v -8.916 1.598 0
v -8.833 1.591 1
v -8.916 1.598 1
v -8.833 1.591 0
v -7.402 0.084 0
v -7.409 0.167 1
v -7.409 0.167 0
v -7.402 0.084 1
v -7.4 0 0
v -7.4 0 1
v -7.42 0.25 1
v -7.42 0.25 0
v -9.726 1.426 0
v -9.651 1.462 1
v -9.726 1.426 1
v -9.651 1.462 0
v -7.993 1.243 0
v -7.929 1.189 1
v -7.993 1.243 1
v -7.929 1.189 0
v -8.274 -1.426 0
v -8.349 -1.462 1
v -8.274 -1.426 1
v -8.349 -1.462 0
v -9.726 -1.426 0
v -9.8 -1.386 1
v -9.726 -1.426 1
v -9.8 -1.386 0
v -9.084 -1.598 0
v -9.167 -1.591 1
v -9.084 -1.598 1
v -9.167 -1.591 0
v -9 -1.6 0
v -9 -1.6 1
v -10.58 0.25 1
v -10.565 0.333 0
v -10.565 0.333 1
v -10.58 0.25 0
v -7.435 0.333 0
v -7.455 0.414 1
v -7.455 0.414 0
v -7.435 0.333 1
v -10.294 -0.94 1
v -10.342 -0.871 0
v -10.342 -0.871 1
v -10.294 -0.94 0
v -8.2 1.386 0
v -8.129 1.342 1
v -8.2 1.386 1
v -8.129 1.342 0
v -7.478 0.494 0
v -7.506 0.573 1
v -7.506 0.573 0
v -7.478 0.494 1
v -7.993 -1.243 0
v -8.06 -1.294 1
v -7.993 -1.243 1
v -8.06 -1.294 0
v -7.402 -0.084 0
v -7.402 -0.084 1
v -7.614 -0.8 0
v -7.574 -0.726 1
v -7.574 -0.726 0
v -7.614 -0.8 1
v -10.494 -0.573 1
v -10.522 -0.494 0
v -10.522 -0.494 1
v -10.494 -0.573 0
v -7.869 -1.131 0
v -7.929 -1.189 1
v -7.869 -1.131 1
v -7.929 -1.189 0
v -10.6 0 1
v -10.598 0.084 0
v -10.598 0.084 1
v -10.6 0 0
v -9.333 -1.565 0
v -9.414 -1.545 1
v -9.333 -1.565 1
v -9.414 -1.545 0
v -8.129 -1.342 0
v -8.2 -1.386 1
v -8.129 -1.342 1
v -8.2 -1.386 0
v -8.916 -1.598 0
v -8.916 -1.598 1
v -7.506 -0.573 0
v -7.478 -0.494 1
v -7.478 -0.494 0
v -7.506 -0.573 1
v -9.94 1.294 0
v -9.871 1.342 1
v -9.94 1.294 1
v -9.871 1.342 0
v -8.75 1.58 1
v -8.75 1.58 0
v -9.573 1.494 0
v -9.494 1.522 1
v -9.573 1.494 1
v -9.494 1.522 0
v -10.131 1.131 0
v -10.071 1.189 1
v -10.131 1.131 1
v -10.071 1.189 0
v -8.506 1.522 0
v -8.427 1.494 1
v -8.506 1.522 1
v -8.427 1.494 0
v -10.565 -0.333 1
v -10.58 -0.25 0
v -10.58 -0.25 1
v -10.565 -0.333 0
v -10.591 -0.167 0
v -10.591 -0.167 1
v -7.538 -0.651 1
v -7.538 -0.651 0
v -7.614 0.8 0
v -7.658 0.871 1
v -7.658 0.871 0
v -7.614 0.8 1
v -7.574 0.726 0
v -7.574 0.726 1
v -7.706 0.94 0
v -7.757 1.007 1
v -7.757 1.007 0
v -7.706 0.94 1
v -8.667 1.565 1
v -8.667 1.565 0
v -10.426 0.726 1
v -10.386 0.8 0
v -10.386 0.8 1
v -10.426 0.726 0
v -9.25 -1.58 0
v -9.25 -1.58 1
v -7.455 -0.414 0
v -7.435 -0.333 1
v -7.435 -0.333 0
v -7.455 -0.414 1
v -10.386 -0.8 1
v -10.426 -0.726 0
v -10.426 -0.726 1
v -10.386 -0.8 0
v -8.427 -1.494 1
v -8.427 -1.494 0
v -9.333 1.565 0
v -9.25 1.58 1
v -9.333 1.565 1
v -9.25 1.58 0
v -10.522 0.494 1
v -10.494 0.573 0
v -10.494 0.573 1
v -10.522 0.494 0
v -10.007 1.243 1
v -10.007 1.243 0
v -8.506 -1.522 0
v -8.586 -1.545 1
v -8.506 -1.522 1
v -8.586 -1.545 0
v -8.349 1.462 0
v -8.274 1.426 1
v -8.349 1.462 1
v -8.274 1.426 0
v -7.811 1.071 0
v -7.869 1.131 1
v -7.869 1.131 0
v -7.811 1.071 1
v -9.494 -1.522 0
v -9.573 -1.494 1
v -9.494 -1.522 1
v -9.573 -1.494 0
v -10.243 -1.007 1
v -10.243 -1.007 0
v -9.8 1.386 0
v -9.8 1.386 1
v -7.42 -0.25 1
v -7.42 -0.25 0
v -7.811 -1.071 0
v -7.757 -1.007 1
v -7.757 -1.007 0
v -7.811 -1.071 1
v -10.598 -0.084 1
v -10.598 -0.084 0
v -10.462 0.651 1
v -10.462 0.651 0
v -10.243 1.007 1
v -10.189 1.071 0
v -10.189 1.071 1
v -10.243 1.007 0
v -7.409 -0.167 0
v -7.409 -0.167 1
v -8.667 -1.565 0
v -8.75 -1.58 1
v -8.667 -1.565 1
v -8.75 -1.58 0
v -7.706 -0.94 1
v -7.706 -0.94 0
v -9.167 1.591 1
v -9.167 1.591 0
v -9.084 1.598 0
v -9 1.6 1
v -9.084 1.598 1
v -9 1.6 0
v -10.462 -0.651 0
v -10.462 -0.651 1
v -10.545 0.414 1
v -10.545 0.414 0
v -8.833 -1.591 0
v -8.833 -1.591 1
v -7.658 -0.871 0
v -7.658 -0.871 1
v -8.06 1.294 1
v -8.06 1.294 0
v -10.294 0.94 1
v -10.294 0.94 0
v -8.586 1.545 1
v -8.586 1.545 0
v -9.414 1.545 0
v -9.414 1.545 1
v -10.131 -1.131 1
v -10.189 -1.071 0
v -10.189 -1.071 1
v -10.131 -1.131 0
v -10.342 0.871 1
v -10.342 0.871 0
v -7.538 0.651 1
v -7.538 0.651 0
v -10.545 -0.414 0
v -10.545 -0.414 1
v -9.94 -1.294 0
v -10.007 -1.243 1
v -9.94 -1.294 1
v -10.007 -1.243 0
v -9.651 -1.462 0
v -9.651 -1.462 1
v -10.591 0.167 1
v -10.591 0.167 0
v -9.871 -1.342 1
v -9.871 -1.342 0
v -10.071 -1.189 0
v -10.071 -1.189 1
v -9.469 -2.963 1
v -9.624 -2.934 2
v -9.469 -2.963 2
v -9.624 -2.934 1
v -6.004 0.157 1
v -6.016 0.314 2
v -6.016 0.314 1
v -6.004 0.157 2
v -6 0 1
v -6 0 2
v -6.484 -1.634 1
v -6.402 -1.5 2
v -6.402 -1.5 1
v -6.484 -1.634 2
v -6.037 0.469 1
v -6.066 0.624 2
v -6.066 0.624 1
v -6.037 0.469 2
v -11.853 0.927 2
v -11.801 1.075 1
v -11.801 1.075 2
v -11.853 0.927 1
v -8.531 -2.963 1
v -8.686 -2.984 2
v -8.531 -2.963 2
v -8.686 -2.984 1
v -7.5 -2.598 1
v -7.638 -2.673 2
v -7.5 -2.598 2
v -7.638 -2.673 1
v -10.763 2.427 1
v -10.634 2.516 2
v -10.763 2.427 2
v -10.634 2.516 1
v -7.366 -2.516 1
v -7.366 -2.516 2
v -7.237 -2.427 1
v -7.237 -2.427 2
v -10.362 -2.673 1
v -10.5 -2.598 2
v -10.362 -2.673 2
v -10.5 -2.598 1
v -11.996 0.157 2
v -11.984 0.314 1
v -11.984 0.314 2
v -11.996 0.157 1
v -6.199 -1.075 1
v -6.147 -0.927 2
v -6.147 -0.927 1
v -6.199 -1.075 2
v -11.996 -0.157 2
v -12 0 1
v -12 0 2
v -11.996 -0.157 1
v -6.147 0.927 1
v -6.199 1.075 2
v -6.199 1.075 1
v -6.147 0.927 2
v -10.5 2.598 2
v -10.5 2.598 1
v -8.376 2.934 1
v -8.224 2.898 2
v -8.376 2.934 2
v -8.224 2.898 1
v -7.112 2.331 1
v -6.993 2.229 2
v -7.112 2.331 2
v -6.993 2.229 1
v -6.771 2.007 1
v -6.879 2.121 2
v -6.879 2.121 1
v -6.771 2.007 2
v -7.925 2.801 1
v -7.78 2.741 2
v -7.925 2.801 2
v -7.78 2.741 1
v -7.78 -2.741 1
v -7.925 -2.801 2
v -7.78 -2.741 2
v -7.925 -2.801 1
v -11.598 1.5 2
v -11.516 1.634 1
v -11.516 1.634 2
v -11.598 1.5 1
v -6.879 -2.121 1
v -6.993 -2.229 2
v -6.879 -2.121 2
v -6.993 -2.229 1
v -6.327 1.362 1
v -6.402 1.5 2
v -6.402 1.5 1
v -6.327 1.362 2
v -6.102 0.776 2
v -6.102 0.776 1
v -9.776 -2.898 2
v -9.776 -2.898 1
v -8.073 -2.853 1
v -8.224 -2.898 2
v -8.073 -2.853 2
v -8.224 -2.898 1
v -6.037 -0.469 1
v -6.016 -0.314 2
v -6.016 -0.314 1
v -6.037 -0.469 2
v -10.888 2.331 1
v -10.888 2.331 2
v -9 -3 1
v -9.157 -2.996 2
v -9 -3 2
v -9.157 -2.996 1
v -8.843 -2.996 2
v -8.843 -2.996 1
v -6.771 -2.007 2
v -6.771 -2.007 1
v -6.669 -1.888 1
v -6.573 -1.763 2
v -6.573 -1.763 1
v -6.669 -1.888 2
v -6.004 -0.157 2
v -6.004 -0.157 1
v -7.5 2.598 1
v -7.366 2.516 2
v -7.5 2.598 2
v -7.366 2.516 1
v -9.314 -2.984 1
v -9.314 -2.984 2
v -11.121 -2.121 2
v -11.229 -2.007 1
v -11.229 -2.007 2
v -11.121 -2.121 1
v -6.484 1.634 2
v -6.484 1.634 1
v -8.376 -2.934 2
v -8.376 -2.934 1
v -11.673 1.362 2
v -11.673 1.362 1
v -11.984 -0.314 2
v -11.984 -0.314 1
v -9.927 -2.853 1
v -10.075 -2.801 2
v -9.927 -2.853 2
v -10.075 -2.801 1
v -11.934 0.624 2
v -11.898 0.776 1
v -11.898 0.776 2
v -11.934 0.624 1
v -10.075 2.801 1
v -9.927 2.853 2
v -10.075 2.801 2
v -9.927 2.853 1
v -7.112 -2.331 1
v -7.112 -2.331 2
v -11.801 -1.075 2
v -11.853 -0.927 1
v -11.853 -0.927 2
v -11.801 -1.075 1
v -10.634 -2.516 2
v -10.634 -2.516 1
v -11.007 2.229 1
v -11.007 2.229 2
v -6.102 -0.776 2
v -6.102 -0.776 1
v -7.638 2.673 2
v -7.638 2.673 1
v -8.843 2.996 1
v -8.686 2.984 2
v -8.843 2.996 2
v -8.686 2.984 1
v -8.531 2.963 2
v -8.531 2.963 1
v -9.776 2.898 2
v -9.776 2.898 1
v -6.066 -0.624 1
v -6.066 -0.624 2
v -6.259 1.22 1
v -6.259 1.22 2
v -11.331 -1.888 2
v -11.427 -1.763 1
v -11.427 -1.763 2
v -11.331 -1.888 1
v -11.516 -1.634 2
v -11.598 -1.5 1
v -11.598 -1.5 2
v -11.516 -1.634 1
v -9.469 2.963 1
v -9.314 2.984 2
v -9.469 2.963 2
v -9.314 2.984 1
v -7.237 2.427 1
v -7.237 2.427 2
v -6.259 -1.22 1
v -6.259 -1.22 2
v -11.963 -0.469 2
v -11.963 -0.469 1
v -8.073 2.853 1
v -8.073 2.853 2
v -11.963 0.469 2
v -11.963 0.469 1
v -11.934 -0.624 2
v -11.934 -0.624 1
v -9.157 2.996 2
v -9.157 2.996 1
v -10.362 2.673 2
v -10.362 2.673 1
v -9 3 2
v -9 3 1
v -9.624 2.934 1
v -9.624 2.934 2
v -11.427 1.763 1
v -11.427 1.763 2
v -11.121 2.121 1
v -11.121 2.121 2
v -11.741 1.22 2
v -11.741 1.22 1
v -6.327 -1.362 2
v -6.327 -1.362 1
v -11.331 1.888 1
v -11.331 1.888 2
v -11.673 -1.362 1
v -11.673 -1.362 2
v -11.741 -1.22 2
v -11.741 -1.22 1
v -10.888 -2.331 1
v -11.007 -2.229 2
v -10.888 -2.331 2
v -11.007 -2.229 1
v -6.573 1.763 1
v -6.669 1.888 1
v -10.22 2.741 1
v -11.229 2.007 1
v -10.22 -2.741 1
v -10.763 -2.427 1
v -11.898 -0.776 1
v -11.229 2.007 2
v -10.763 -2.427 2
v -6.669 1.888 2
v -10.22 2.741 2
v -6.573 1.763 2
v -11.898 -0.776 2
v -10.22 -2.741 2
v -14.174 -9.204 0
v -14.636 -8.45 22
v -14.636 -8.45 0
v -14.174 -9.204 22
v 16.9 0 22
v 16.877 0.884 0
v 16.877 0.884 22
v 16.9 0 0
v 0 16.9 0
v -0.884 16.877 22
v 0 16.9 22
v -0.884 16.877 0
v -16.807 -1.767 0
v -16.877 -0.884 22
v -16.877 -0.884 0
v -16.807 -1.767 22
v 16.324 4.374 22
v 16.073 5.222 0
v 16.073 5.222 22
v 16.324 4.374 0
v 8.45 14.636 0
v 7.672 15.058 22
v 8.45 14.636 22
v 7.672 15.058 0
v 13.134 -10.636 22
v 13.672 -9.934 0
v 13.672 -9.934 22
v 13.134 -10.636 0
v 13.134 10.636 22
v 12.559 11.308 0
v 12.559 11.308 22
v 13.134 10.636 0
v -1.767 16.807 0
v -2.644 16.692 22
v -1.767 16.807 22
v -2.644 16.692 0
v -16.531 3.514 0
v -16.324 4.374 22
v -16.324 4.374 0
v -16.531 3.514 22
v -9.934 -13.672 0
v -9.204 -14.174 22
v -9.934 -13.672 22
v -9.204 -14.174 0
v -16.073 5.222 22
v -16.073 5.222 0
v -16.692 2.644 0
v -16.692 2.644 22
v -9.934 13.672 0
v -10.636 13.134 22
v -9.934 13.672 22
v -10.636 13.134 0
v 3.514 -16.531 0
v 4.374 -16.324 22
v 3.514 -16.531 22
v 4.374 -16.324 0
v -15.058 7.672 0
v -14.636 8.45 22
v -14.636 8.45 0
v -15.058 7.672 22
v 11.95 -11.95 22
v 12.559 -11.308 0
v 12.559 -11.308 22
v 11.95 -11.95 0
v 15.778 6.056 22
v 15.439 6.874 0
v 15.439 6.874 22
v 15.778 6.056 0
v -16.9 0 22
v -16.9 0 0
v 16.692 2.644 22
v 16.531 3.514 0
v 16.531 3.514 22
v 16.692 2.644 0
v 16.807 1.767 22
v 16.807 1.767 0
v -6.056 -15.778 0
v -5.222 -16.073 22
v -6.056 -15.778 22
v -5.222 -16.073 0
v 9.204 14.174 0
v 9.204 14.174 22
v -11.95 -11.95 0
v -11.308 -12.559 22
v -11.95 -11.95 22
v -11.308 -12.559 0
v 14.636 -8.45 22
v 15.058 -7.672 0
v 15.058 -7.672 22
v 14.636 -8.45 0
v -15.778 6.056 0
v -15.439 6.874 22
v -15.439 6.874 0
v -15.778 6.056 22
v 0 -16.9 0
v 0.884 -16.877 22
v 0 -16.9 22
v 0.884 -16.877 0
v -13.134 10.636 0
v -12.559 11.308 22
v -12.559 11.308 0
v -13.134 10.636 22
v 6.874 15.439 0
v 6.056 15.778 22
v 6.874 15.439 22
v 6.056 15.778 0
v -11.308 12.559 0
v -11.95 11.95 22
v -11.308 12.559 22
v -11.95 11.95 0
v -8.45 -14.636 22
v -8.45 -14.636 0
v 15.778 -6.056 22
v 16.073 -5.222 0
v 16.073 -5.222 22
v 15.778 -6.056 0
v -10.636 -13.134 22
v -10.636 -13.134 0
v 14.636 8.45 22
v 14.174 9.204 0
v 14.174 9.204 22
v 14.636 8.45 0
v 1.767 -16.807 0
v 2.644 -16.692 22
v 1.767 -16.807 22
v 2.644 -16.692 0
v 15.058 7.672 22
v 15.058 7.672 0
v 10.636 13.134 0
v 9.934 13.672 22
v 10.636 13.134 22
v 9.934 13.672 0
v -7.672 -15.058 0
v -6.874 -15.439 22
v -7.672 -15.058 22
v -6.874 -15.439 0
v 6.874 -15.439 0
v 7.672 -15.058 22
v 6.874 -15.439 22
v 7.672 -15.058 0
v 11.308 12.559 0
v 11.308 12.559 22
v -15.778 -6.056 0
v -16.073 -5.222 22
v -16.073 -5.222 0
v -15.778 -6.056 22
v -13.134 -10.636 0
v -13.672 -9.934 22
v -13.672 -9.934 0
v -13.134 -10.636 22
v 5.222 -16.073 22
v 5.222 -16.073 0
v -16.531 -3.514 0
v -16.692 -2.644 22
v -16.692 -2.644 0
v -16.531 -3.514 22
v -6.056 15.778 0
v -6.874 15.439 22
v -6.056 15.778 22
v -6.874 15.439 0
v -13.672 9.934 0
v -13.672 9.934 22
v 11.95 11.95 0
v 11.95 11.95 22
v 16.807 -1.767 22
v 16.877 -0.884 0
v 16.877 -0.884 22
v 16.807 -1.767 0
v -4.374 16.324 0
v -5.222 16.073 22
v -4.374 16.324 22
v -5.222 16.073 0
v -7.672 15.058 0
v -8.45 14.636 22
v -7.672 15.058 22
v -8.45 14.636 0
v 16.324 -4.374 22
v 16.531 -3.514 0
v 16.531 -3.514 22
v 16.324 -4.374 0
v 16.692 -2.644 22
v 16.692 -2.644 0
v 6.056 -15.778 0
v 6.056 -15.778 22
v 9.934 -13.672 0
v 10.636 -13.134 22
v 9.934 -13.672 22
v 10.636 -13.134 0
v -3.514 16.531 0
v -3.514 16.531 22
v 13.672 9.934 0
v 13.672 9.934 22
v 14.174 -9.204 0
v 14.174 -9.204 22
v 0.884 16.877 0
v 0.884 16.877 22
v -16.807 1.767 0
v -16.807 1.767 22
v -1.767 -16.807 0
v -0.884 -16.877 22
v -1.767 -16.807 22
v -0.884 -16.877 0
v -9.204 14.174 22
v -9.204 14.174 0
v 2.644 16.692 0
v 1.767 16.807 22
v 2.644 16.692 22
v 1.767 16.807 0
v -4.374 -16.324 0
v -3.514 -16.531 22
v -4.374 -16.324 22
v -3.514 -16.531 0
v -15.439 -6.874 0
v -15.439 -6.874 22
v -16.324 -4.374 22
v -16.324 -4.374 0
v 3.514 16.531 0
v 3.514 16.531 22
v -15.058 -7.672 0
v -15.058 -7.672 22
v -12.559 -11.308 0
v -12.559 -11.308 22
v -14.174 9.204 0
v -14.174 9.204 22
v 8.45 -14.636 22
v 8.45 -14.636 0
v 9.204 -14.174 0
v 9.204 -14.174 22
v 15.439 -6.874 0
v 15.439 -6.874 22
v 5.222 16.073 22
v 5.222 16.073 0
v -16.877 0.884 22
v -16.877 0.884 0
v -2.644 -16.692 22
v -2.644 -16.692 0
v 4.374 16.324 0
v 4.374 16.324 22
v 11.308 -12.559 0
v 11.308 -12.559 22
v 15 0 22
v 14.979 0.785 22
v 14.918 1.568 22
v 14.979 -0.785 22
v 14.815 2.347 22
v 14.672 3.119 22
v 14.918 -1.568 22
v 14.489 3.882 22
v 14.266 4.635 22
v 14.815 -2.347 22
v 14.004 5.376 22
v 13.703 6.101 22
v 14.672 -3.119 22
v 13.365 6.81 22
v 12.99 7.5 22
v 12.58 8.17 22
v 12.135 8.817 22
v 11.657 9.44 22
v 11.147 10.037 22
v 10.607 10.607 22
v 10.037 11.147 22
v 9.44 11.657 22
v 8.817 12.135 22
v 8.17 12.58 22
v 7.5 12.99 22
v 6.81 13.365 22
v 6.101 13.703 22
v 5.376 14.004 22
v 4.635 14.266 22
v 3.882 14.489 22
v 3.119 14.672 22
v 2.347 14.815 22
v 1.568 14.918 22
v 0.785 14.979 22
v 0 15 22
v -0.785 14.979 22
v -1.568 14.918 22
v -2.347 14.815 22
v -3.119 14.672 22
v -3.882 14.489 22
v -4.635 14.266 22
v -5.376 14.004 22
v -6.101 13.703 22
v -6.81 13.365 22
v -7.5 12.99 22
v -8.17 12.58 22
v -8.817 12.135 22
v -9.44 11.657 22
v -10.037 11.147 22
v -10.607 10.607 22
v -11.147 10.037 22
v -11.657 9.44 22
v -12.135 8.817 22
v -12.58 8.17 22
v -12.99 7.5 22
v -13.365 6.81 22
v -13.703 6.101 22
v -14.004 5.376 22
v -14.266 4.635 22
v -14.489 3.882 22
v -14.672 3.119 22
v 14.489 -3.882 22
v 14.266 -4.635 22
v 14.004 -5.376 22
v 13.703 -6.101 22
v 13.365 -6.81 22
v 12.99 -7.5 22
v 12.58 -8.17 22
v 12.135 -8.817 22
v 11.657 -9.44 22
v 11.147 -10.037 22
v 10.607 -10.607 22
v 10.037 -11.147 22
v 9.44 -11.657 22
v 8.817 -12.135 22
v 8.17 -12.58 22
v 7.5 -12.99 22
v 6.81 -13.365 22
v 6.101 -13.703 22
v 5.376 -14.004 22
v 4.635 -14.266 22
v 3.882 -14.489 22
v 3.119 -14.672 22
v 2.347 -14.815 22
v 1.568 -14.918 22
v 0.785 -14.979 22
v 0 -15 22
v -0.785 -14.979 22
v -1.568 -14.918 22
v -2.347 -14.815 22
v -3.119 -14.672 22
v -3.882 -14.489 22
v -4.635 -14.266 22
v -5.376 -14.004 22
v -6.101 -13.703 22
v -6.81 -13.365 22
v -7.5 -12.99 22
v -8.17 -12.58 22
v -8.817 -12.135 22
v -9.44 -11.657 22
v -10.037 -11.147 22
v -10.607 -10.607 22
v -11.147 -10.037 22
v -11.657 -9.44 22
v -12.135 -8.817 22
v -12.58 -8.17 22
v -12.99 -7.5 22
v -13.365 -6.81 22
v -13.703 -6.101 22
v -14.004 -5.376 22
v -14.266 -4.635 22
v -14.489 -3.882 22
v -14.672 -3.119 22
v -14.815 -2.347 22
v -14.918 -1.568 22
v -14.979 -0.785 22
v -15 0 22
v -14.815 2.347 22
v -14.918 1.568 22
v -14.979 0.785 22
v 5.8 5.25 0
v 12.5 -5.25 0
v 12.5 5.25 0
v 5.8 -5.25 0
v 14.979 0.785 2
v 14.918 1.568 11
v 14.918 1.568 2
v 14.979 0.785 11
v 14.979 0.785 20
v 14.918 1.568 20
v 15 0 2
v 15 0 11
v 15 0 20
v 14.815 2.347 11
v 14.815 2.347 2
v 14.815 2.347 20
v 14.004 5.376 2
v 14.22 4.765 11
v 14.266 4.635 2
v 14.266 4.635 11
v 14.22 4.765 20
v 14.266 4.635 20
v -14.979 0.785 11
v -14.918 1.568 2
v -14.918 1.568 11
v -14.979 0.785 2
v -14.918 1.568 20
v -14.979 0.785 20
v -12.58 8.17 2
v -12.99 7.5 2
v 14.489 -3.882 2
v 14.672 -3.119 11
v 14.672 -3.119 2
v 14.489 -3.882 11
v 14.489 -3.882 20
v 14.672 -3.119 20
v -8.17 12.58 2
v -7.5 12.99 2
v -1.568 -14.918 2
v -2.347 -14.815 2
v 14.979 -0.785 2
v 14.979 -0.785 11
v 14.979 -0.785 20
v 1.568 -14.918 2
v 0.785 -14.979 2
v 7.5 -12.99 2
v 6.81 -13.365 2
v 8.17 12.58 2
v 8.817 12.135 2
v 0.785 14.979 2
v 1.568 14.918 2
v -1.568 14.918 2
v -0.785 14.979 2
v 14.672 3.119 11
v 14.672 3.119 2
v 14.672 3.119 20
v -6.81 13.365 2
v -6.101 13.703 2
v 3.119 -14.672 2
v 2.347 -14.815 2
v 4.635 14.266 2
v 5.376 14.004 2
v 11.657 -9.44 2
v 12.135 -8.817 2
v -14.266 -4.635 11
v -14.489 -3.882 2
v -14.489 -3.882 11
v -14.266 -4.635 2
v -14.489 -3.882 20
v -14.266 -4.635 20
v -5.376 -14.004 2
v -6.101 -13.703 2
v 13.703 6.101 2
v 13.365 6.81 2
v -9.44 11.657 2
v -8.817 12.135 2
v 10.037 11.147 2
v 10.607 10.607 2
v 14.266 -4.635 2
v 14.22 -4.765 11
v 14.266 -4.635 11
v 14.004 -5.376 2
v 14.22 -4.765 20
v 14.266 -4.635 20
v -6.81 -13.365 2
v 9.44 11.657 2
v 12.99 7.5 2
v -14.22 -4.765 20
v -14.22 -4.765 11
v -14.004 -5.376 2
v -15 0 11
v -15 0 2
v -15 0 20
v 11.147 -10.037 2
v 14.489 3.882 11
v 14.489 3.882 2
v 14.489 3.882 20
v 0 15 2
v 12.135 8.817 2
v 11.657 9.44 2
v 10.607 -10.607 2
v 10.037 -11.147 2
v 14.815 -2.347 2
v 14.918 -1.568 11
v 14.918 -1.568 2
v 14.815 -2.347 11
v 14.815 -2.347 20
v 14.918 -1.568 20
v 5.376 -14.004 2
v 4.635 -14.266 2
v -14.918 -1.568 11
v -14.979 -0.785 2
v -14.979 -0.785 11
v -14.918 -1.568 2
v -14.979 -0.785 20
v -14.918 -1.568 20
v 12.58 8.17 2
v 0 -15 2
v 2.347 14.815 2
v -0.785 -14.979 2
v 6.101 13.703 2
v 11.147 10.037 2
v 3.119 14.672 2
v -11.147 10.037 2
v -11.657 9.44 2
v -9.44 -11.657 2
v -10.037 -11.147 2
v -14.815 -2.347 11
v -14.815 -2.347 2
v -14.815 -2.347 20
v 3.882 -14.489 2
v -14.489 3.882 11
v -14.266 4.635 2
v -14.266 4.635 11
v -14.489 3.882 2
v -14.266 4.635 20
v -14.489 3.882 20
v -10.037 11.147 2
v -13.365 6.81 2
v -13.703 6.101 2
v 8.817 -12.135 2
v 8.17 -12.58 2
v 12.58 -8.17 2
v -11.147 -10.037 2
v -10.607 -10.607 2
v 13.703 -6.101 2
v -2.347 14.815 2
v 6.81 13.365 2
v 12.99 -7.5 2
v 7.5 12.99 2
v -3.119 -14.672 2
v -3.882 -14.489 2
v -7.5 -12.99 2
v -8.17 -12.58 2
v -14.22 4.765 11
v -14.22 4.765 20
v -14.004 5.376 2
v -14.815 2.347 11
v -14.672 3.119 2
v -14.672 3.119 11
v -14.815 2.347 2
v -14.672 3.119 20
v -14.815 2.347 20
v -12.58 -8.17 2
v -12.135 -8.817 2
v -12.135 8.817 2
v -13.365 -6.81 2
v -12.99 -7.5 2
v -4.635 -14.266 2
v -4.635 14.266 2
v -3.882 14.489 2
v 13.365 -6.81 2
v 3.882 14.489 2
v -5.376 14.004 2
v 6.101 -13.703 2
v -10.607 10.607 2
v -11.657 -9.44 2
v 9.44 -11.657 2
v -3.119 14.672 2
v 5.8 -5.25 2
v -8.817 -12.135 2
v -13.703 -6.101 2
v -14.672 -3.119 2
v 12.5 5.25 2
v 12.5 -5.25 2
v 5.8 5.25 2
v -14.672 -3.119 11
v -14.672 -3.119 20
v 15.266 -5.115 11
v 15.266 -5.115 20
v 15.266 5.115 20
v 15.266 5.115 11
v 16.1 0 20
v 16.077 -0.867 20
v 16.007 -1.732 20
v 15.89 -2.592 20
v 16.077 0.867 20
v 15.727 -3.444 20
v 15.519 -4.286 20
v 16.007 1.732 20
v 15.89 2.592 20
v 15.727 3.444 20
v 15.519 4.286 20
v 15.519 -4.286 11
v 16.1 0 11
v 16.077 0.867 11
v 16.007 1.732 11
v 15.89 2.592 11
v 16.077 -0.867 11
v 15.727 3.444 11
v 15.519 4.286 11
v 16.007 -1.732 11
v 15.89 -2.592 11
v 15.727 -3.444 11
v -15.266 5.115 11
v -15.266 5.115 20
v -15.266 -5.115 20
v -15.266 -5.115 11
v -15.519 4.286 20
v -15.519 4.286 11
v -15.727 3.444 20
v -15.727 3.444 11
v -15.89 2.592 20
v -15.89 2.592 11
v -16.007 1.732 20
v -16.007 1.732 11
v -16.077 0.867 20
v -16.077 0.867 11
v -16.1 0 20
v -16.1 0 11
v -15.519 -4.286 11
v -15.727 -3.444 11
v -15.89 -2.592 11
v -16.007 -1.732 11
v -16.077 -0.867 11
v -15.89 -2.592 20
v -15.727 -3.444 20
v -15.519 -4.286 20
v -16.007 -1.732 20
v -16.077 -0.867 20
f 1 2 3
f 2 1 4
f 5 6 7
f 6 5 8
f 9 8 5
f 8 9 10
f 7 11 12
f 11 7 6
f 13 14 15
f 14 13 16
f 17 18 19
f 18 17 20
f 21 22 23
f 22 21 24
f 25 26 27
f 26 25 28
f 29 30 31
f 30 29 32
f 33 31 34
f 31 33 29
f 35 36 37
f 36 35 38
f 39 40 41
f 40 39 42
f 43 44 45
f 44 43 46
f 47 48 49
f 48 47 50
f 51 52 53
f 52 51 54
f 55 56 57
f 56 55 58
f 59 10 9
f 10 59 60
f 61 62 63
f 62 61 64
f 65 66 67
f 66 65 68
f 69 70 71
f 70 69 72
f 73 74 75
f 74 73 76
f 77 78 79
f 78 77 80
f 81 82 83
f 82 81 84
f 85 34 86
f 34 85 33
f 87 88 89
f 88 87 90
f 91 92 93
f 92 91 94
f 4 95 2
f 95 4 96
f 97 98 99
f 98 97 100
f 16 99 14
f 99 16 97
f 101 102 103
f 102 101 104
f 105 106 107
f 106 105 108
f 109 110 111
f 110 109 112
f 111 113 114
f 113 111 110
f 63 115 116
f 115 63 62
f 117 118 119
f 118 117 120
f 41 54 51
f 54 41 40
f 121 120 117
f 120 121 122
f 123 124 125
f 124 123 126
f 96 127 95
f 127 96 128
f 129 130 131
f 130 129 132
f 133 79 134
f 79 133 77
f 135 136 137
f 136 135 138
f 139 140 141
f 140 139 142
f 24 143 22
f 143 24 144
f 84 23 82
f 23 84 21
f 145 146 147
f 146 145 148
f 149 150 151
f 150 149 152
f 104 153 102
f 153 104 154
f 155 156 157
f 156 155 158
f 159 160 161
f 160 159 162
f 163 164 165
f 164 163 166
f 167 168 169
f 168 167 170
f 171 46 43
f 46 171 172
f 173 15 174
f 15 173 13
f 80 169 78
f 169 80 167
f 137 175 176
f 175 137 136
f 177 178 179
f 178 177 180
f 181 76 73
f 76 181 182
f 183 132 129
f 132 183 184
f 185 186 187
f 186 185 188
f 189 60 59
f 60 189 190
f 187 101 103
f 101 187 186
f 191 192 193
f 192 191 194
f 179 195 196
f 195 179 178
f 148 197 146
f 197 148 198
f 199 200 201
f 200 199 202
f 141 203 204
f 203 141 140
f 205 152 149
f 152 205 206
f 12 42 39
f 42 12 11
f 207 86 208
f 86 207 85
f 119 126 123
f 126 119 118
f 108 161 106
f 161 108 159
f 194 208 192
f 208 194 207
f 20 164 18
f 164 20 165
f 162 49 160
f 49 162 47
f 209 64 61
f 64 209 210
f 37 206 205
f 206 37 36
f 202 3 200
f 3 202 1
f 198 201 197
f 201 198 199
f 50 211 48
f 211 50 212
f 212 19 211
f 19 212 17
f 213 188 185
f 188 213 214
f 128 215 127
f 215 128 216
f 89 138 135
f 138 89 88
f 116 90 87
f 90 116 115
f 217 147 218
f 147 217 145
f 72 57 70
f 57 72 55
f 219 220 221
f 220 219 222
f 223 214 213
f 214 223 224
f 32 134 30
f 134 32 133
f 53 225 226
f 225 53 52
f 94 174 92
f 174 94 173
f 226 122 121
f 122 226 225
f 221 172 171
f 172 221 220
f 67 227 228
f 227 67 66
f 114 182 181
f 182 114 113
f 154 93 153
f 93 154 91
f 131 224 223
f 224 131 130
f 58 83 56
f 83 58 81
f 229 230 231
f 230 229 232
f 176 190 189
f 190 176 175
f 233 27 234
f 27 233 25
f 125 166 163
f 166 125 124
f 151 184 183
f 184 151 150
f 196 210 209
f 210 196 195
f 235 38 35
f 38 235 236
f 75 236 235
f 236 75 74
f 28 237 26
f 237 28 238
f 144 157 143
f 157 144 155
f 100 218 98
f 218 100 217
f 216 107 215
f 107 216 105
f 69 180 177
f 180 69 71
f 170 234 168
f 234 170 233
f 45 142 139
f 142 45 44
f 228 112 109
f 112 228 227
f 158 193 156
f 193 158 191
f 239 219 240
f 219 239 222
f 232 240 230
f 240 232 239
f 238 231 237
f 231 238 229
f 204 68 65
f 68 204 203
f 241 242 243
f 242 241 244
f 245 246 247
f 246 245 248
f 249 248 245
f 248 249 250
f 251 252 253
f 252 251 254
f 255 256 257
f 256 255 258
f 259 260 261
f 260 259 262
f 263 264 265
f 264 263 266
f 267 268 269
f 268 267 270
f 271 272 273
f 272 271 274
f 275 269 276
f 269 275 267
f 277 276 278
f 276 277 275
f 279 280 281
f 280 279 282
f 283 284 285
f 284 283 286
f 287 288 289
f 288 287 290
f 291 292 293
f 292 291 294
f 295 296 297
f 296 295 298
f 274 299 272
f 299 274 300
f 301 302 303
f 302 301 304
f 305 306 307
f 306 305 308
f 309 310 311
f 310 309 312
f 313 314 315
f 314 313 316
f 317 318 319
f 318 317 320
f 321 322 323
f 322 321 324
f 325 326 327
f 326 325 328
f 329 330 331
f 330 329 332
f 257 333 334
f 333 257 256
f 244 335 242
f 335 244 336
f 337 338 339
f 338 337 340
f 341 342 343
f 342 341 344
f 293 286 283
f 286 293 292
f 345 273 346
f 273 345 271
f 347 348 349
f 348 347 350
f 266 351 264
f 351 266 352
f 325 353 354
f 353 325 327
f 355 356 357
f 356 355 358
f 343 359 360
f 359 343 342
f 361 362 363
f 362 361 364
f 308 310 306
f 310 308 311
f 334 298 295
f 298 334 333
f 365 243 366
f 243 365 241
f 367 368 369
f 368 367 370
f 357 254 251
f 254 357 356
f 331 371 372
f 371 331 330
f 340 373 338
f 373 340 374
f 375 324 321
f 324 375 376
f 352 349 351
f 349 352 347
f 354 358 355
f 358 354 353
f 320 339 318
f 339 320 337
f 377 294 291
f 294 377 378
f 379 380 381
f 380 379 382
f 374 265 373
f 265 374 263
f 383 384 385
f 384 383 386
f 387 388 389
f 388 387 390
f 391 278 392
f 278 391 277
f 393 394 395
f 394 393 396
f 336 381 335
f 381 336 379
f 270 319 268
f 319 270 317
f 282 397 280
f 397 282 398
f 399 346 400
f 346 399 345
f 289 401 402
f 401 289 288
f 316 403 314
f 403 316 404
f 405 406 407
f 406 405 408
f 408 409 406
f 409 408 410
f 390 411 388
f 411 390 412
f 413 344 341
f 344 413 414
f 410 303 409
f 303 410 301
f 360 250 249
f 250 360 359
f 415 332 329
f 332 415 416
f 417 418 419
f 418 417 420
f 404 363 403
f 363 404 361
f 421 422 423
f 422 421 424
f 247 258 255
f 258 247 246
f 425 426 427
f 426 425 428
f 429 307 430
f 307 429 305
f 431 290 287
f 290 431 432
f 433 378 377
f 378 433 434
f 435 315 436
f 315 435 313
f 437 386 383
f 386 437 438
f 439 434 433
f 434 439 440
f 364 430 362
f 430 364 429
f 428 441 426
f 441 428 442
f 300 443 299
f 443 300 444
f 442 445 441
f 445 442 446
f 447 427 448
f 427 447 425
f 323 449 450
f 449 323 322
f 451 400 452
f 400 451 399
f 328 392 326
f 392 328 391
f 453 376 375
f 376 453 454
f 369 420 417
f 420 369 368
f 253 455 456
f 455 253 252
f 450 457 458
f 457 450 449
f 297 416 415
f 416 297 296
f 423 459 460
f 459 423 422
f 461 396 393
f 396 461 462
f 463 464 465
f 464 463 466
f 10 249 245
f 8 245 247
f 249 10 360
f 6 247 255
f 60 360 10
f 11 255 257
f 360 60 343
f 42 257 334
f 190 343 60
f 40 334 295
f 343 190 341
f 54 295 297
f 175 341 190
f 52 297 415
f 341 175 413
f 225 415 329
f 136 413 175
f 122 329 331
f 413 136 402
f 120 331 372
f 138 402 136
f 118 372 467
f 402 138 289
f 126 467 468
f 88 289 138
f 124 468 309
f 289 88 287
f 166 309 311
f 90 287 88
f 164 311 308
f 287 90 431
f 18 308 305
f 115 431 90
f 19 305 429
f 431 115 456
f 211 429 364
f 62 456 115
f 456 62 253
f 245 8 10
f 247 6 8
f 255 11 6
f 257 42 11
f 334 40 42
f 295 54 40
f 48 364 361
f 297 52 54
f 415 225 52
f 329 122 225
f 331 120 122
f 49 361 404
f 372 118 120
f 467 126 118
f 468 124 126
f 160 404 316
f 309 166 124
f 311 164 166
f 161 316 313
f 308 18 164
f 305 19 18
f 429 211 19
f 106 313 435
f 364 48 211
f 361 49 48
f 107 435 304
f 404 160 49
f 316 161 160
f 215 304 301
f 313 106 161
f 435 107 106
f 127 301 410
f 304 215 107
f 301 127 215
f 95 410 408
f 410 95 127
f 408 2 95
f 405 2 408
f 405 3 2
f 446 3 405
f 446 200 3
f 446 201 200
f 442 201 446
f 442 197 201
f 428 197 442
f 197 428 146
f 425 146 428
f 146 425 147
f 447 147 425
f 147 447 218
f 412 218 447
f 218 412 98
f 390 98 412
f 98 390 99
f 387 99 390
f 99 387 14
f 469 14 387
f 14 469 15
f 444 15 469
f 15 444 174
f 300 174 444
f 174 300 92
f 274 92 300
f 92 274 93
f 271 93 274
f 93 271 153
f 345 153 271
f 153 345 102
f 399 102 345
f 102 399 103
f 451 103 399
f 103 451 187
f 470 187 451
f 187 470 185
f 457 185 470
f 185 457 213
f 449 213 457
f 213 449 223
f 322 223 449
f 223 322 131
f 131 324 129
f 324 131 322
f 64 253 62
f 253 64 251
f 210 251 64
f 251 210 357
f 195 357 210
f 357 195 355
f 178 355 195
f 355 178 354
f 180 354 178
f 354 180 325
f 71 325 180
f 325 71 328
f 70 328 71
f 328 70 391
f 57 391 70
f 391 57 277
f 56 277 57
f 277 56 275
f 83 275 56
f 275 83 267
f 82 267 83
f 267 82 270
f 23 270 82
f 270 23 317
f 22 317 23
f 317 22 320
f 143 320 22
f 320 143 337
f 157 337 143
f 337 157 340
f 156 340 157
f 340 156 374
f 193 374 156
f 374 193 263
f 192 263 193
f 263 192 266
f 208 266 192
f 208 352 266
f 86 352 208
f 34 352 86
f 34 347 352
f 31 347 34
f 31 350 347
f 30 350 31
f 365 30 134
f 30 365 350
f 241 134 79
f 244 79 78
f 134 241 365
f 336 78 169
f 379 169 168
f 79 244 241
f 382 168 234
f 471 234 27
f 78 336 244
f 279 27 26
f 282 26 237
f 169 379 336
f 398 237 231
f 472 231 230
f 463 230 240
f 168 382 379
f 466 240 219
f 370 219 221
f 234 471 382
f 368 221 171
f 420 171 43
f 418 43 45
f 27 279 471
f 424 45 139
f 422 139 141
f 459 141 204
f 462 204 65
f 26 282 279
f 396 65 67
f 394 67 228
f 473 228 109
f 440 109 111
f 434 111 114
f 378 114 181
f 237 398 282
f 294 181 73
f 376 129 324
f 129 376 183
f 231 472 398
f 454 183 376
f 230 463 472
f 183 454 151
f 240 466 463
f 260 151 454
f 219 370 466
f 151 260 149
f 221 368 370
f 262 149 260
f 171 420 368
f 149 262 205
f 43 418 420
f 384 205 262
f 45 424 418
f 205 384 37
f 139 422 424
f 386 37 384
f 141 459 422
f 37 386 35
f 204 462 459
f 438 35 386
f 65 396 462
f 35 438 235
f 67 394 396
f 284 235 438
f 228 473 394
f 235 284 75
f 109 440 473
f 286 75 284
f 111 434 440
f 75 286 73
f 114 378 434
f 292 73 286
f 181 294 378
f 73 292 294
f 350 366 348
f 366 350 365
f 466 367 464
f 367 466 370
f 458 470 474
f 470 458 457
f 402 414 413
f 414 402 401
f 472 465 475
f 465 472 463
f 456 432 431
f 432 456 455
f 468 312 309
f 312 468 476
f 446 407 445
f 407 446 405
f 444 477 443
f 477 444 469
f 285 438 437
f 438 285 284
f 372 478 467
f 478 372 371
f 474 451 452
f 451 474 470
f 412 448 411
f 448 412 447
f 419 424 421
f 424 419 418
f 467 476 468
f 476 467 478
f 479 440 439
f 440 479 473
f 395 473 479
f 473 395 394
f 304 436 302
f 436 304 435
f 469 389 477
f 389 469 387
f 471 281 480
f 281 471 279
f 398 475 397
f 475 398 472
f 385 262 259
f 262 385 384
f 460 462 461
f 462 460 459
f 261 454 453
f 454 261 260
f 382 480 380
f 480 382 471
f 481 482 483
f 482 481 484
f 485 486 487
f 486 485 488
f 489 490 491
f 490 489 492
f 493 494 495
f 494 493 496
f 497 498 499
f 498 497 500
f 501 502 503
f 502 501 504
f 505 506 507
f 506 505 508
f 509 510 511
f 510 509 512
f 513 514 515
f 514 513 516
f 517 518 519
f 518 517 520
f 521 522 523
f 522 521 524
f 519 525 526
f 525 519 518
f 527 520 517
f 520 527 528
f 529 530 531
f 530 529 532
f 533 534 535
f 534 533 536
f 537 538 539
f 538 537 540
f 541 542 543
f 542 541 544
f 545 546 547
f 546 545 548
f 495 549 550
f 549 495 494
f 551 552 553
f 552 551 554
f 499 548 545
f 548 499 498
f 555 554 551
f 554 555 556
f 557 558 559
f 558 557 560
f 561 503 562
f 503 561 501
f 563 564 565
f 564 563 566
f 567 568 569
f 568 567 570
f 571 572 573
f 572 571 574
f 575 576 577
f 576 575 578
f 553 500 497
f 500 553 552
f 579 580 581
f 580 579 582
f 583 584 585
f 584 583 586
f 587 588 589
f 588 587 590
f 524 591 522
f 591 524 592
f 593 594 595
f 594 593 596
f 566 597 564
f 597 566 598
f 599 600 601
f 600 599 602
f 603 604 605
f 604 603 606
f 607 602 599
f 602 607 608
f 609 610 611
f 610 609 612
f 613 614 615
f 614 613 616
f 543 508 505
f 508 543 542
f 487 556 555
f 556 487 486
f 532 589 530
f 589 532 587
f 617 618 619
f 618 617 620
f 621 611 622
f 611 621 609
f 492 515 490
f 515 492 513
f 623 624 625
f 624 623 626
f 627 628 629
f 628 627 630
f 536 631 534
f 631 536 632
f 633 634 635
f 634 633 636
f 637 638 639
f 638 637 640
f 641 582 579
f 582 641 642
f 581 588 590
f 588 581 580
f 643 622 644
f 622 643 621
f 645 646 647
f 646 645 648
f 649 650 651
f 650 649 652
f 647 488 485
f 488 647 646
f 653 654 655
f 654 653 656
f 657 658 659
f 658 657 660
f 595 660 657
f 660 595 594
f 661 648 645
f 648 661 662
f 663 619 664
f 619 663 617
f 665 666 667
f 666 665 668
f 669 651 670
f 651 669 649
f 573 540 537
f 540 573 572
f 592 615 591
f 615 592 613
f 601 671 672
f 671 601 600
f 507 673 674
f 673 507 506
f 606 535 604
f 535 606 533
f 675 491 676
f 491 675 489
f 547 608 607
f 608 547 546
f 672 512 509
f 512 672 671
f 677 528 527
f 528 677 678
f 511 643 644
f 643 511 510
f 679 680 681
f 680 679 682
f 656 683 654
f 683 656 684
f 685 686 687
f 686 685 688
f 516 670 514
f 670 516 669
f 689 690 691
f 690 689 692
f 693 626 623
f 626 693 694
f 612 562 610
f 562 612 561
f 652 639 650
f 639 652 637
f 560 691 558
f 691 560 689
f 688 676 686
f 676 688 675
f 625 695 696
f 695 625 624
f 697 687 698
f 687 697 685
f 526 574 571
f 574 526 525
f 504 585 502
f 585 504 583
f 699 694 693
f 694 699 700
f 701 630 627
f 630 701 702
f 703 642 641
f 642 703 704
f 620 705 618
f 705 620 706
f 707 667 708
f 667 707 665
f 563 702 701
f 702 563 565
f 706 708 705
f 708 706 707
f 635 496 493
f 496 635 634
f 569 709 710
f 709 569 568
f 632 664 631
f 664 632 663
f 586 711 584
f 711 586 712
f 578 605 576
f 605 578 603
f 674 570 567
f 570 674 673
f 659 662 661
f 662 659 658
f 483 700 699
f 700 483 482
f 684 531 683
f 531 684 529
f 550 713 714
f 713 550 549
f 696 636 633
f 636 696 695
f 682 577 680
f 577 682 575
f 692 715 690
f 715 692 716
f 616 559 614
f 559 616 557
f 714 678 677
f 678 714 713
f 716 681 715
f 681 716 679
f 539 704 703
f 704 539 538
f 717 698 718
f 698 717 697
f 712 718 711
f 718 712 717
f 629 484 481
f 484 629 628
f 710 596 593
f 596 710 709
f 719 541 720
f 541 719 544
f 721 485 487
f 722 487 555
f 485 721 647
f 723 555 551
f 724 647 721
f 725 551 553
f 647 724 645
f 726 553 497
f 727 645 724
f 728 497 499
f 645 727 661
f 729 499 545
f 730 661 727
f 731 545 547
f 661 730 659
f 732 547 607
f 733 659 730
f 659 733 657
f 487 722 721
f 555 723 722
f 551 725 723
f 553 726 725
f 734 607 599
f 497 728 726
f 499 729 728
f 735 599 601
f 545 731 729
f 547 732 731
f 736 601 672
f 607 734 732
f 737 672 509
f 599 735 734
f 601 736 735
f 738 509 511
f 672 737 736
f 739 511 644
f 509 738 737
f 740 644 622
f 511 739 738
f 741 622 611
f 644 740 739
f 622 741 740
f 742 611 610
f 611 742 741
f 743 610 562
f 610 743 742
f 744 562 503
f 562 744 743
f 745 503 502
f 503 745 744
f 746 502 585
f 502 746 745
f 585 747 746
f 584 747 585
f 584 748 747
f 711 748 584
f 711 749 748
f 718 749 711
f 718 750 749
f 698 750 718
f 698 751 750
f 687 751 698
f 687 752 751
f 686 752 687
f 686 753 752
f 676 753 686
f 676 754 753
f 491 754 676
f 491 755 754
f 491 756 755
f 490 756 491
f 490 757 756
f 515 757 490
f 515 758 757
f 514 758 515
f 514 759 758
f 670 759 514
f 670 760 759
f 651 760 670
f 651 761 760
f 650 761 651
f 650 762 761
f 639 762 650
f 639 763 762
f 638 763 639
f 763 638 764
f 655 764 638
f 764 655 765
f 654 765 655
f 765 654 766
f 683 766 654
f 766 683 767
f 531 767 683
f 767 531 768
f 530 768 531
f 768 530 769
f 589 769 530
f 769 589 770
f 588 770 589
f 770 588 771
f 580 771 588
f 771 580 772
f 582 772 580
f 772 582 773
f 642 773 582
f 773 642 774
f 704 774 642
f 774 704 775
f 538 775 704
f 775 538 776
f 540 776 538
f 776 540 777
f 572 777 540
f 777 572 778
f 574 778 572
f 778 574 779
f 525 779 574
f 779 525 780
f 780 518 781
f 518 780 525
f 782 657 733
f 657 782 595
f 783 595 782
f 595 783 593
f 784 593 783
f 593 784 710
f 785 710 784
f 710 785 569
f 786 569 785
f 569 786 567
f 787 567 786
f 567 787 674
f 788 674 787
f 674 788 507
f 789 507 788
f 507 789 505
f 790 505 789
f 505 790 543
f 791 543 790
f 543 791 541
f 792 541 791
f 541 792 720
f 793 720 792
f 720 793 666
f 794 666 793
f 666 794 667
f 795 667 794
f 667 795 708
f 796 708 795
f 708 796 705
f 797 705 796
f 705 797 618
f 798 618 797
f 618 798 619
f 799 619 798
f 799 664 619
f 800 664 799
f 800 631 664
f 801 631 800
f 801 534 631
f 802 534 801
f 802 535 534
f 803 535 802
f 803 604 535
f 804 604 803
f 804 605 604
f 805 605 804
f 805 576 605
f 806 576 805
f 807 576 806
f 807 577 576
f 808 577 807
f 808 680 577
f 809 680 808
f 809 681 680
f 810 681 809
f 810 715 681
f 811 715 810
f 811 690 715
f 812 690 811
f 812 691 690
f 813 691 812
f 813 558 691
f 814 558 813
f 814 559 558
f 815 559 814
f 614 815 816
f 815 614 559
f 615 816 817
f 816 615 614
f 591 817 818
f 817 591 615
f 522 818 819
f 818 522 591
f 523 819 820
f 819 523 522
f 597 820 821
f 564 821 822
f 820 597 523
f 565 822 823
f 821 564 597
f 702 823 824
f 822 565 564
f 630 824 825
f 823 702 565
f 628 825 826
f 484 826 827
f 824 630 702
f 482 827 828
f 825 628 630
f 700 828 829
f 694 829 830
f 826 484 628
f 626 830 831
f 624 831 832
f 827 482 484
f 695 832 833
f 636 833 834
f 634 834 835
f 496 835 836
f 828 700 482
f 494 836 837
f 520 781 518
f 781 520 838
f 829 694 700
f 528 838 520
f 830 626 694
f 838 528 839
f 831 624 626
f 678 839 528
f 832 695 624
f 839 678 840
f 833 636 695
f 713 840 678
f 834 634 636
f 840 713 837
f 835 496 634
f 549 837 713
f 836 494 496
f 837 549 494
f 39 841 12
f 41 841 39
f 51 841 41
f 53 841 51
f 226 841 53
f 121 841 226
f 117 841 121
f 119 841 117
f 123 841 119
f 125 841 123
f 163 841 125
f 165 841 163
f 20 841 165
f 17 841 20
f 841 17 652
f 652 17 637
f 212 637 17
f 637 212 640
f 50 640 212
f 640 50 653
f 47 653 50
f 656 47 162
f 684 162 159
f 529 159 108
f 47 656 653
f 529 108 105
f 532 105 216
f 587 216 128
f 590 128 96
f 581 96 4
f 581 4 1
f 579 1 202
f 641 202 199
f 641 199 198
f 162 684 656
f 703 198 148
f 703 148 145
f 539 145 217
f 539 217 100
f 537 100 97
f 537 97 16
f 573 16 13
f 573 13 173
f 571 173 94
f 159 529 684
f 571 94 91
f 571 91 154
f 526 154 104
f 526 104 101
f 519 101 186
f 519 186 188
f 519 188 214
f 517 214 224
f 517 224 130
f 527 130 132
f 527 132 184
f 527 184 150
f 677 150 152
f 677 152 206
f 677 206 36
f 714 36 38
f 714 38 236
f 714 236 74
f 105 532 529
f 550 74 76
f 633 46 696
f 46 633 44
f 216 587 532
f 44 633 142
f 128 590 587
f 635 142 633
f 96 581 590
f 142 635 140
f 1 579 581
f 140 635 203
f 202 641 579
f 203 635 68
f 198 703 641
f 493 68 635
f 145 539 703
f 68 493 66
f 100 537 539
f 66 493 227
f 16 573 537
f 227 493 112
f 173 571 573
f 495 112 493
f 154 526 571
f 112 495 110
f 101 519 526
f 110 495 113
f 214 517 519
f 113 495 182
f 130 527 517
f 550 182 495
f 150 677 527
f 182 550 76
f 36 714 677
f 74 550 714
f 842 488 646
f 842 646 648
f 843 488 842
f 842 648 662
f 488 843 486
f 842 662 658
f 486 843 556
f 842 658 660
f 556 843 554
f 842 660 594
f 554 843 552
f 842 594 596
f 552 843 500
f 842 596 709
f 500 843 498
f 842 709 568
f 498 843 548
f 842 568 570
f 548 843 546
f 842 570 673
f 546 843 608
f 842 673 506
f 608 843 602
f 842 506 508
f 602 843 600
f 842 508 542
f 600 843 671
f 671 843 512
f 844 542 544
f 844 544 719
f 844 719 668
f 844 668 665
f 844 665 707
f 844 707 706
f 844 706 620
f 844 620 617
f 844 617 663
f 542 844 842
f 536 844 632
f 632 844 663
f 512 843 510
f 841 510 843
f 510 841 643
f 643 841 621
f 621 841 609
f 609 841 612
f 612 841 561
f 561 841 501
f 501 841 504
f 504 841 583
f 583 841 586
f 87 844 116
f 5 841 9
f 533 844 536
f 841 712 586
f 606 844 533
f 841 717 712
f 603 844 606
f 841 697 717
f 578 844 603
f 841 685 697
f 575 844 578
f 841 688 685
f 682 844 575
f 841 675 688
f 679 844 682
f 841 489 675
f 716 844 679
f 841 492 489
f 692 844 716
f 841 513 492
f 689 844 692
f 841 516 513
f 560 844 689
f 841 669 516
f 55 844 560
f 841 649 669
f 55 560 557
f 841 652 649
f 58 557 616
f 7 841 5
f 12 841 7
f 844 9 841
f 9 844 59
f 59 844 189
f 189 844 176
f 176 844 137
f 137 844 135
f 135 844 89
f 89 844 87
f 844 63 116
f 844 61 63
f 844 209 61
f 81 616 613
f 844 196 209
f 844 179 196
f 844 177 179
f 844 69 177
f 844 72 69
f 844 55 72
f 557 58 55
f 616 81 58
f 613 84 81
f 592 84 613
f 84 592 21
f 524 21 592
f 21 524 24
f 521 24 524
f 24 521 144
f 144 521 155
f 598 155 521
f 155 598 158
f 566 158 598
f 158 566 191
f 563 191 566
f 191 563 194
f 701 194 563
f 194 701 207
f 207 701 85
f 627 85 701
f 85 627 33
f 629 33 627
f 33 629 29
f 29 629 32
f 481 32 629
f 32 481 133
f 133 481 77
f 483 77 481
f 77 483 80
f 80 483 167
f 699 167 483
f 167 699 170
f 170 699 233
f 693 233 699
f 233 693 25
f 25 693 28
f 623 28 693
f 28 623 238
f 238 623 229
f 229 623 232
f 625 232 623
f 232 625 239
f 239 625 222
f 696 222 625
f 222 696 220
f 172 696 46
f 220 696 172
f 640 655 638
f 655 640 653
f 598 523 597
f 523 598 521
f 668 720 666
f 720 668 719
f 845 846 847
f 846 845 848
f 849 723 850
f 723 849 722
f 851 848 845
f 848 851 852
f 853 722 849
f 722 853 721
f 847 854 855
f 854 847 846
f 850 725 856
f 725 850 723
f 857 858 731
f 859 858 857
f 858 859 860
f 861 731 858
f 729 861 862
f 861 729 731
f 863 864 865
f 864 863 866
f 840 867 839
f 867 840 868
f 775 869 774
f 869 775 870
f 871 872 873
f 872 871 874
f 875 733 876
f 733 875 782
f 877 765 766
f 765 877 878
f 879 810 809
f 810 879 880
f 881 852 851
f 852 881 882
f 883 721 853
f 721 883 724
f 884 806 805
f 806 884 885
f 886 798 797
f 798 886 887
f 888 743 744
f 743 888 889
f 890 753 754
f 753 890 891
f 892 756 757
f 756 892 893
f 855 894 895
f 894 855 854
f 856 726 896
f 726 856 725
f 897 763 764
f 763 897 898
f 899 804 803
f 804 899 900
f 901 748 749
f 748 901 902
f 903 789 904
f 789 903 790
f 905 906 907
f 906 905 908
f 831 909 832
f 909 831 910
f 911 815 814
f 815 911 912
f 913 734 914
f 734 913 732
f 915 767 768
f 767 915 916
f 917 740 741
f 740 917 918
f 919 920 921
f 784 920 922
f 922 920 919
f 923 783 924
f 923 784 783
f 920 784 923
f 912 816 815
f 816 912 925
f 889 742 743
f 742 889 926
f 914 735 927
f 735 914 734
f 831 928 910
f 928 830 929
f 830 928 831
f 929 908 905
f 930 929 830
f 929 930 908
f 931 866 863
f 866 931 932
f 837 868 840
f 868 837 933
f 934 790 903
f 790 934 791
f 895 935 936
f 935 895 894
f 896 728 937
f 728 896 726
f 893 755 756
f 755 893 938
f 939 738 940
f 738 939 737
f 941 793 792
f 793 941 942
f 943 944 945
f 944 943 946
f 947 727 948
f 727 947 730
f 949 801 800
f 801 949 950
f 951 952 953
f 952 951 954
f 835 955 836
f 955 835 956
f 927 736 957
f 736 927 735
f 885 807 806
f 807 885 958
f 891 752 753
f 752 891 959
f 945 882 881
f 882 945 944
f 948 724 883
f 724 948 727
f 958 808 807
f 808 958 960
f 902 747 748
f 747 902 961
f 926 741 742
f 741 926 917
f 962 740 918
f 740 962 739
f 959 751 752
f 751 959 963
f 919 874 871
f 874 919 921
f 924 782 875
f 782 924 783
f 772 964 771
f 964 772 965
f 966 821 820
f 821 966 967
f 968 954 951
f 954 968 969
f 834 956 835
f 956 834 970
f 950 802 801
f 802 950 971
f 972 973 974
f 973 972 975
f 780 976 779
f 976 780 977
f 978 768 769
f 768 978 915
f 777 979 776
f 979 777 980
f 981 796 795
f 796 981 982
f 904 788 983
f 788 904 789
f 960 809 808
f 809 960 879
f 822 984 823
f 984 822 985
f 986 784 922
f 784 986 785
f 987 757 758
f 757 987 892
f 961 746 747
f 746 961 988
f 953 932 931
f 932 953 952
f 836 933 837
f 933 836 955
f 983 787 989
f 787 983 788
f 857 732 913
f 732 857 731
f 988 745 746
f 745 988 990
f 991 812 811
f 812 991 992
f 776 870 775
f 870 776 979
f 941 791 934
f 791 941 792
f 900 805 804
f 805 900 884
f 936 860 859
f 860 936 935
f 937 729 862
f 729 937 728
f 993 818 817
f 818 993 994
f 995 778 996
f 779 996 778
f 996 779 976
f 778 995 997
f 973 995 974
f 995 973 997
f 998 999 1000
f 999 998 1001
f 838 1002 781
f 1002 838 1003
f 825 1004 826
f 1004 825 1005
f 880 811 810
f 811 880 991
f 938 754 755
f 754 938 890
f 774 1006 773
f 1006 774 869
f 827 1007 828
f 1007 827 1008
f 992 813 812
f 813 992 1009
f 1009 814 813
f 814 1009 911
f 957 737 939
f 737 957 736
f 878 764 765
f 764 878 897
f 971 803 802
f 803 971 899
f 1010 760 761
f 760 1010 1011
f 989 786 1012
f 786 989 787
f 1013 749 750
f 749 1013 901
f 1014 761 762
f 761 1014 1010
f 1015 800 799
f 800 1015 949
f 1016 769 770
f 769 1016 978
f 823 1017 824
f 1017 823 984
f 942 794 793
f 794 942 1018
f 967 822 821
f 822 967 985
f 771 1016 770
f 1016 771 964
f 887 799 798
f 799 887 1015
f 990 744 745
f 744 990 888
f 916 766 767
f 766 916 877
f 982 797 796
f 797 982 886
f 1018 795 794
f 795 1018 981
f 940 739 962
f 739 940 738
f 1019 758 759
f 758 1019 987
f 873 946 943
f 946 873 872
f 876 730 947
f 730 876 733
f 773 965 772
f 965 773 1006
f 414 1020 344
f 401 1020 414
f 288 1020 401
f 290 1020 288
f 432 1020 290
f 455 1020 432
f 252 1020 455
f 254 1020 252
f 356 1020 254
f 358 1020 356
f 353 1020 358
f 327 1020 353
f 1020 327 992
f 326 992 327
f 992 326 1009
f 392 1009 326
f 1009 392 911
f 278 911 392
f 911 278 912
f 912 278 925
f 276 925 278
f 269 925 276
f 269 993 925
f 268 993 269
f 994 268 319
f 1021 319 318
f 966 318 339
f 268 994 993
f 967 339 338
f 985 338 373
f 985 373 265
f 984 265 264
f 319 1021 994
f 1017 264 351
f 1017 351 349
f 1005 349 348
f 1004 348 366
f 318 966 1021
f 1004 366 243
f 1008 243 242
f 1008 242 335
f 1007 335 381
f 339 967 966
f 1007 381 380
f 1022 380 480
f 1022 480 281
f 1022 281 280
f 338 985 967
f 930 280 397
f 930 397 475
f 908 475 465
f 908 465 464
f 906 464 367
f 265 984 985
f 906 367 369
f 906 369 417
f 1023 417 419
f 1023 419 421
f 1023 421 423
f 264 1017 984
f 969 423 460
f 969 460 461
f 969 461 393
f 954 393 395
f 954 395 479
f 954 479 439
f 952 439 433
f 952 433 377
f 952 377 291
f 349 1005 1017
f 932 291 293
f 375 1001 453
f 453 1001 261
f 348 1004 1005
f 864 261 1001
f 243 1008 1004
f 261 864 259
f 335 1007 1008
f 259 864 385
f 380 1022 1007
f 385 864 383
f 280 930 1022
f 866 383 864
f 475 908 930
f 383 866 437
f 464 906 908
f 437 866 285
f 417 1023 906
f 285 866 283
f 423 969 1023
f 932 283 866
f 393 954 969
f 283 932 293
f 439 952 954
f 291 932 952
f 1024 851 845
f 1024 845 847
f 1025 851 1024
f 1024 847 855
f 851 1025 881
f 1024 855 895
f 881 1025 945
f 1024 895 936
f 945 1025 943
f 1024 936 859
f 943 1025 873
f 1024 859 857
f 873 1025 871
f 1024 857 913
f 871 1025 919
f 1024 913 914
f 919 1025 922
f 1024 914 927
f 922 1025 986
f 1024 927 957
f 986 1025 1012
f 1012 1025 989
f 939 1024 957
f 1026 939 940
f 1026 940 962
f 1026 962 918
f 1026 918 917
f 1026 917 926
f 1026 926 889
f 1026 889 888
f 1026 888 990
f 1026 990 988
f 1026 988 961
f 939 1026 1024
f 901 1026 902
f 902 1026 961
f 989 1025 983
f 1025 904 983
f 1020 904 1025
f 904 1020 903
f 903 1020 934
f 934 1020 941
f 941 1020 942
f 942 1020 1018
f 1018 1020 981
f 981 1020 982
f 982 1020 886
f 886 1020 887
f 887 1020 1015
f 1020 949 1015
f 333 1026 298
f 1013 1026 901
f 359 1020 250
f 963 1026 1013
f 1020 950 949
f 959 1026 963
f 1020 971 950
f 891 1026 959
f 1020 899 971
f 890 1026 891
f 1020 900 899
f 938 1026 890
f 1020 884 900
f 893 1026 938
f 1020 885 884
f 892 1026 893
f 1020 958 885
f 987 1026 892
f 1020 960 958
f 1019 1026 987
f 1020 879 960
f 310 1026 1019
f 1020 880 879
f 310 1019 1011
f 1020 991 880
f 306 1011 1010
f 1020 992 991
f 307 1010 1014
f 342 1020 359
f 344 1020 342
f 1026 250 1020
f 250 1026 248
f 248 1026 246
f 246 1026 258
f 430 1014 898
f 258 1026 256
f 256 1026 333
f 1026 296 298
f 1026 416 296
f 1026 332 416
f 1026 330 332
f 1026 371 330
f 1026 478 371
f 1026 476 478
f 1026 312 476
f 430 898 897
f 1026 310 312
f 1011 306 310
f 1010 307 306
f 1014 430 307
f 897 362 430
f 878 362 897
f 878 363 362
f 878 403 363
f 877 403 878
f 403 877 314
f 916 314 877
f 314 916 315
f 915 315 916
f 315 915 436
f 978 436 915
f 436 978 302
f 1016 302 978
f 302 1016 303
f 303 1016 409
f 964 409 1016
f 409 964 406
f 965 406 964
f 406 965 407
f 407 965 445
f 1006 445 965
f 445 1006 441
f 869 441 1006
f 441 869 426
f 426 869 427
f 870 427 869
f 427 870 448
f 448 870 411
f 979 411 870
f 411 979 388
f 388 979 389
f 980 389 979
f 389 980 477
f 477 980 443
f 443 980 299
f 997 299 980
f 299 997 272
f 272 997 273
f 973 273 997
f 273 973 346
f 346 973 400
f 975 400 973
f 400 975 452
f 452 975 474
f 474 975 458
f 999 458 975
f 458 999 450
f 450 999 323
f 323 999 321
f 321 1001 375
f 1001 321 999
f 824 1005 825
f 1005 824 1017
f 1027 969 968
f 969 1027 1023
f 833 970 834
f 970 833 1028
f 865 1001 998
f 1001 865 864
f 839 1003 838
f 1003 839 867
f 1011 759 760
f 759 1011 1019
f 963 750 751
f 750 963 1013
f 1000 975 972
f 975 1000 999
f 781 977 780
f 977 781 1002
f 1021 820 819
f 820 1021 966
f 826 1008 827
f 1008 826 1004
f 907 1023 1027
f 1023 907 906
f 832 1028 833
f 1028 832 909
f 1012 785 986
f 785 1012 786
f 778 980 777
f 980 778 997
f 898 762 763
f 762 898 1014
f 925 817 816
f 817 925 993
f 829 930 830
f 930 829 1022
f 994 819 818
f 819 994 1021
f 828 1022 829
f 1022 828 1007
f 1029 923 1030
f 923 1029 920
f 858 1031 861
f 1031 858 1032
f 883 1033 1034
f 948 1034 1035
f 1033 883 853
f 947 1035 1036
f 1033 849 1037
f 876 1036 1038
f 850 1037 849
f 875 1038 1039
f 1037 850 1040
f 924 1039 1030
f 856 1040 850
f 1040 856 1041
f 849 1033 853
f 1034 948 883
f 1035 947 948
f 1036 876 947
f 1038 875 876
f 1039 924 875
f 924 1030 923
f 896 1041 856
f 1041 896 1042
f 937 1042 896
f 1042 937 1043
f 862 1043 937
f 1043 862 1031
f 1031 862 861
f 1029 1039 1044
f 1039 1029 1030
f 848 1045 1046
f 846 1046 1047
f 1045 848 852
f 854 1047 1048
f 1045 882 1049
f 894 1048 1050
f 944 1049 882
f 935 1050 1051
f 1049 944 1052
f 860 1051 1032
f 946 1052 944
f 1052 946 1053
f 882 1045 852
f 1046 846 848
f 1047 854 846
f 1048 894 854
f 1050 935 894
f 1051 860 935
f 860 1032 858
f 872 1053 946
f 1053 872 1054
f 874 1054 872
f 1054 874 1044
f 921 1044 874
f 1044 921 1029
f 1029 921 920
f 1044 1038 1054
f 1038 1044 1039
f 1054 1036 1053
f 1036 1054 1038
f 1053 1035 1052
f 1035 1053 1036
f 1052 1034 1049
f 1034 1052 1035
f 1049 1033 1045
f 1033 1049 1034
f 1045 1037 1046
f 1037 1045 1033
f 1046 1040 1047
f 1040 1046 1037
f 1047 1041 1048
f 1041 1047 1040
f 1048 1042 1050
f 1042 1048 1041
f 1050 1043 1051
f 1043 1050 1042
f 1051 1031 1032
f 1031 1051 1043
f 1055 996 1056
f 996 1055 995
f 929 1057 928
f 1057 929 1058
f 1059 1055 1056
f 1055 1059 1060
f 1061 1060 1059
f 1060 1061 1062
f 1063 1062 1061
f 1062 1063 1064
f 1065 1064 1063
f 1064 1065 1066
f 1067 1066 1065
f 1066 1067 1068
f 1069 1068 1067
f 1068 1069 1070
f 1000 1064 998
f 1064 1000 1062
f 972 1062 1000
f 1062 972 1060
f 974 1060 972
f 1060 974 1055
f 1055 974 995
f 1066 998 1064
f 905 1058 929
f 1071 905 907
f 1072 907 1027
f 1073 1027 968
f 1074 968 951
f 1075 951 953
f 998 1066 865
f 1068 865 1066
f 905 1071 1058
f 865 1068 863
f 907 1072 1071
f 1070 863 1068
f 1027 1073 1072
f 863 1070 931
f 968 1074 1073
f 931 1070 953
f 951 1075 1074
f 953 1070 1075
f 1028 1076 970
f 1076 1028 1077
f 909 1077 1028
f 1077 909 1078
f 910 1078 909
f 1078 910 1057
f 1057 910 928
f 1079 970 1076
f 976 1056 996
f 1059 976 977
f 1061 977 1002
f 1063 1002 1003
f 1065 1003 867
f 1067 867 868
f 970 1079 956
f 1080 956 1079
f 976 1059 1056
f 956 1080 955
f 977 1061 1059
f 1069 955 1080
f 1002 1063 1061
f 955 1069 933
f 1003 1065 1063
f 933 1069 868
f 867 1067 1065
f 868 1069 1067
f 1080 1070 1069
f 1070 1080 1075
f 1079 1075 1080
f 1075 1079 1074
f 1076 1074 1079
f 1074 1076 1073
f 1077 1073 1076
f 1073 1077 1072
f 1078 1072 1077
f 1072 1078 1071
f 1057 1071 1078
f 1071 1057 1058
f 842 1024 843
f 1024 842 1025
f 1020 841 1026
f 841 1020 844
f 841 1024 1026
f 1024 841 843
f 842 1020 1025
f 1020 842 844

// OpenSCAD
// Voltmeter holder tube — bigger of the two from Suporte+Voltimetro+3+v1.stl,
// upright (axis = +Z) with no tilt. Holds a ZN30 round digital voltmeter
// (33.8 mm bezel, 30 mm body, 18.4 mm total height). Outer Ø matches the
// bezel so the bezel sits flush on the rim. Closed bottom.
//
// ZN30 has two opposing vertical spring-clip tabs on the body. As the meter
// is pressed down into the holder, the clips deflect inward against the
// cavity wall, then snap back outward into the slit pockets. The meter is
// retained because the clip catches on the SLIT TOP EDGE.
//   • Slits are pockets on the inner wall — they do NOT cut through to the
//     outside; an outer skin of `outer_skin` mm is left intact.
//   • A lip of `top_lip` mm is left above each slit so the clip has a top
//     edge to catch on.
//
// Bottom features:
//   • Connector hole (10.5 × 6.7 mm) on the +X side, aligned with one slit.
//   • M3 mounting hole on the −X side, with a 1 mm counterbore on the
//     cavity side. Floor is only 2 mm so the M3 SHCS head (~3 mm tall)
//     protrudes ~2 mm into the cavity — fine because the meter body
//     bottoms out well above the floor.

inner_d      = 30;     // body / cutout
outer_d      = 33.8;   // bezel
inner_depth  = 20;
floor_t      = 2;

// spring-clip slits — clip 9.7 mm wide × 9 mm axial (vertical-press tabs)
clip_w     = 9.7;   // arc length on the inner wall
clip_h     = 9;     // axial depth of the clip / slit
top_lip    = 2;     // material left above the slit (catch surface for the clip)
outer_skin = 0.8;   // outer wall left intact (slit is a pocket, not a window)

// connector hole (+X side, aligned with the 0° slit)
hole_long   = 10.5;
hole_short  = 6.7;
hole_gap    = 2.5;          // mid-of-long-side to inner-circle edge

// M3 mounting hole (−X side)
m3_clearance_d = 3.2;       // close fit for M3 bolt
m3_head_d      = 6.0;       // counterbore Ø for M3 SHCS head (Ø5.5 + clearance)
m3_clamp_t     = 1.0;       // floor left below the counterbore (clamping)
m3_x           = -9;        // bolt centre, mirror of connector hole side

height = inner_depth + floor_t;
wall   = (outer_d - inner_d) / 2;

// arc-length → sweep angle on the inner wall
slit_angle = clip_w / (inner_d / 2) * 180 / PI;

$fn = 120;

module slit_at(direction_deg) {
    slit_depth = wall - outer_skin;
    rotate([0, 0, direction_deg - slit_angle / 2])
        rotate_extrude(angle = slit_angle)
            translate([inner_d / 2 - 0.5, height - top_lip - clip_h])
                square([slit_depth + 0.5, clip_h]);
}

module connector_hole() {
    translate([inner_d / 2 - hole_gap - hole_short, -hole_long / 2, -0.1])
        cube([hole_short, hole_long, floor_t + 0.2]);
}

module m3_mount() {
    // through-hole for the bolt shank
    translate([m3_x, 0, -0.1])
        cylinder(h = floor_t + 0.2, d = m3_clearance_d);
    // counterbore from the cavity-floor side, leaving `m3_clamp_t` for clamping
    translate([m3_x, 0, m3_clamp_t])
        cylinder(h = floor_t - m3_clamp_t + 0.1, d = m3_head_d);
}

difference() {
    cylinder(h = height, d = outer_d);

    translate([0, 0, floor_t])
        cylinder(h = inner_depth + 0.1, d = inner_d);

    slit_at(0);
    slit_at(180);

    connector_hole();
    m3_mount();
}
